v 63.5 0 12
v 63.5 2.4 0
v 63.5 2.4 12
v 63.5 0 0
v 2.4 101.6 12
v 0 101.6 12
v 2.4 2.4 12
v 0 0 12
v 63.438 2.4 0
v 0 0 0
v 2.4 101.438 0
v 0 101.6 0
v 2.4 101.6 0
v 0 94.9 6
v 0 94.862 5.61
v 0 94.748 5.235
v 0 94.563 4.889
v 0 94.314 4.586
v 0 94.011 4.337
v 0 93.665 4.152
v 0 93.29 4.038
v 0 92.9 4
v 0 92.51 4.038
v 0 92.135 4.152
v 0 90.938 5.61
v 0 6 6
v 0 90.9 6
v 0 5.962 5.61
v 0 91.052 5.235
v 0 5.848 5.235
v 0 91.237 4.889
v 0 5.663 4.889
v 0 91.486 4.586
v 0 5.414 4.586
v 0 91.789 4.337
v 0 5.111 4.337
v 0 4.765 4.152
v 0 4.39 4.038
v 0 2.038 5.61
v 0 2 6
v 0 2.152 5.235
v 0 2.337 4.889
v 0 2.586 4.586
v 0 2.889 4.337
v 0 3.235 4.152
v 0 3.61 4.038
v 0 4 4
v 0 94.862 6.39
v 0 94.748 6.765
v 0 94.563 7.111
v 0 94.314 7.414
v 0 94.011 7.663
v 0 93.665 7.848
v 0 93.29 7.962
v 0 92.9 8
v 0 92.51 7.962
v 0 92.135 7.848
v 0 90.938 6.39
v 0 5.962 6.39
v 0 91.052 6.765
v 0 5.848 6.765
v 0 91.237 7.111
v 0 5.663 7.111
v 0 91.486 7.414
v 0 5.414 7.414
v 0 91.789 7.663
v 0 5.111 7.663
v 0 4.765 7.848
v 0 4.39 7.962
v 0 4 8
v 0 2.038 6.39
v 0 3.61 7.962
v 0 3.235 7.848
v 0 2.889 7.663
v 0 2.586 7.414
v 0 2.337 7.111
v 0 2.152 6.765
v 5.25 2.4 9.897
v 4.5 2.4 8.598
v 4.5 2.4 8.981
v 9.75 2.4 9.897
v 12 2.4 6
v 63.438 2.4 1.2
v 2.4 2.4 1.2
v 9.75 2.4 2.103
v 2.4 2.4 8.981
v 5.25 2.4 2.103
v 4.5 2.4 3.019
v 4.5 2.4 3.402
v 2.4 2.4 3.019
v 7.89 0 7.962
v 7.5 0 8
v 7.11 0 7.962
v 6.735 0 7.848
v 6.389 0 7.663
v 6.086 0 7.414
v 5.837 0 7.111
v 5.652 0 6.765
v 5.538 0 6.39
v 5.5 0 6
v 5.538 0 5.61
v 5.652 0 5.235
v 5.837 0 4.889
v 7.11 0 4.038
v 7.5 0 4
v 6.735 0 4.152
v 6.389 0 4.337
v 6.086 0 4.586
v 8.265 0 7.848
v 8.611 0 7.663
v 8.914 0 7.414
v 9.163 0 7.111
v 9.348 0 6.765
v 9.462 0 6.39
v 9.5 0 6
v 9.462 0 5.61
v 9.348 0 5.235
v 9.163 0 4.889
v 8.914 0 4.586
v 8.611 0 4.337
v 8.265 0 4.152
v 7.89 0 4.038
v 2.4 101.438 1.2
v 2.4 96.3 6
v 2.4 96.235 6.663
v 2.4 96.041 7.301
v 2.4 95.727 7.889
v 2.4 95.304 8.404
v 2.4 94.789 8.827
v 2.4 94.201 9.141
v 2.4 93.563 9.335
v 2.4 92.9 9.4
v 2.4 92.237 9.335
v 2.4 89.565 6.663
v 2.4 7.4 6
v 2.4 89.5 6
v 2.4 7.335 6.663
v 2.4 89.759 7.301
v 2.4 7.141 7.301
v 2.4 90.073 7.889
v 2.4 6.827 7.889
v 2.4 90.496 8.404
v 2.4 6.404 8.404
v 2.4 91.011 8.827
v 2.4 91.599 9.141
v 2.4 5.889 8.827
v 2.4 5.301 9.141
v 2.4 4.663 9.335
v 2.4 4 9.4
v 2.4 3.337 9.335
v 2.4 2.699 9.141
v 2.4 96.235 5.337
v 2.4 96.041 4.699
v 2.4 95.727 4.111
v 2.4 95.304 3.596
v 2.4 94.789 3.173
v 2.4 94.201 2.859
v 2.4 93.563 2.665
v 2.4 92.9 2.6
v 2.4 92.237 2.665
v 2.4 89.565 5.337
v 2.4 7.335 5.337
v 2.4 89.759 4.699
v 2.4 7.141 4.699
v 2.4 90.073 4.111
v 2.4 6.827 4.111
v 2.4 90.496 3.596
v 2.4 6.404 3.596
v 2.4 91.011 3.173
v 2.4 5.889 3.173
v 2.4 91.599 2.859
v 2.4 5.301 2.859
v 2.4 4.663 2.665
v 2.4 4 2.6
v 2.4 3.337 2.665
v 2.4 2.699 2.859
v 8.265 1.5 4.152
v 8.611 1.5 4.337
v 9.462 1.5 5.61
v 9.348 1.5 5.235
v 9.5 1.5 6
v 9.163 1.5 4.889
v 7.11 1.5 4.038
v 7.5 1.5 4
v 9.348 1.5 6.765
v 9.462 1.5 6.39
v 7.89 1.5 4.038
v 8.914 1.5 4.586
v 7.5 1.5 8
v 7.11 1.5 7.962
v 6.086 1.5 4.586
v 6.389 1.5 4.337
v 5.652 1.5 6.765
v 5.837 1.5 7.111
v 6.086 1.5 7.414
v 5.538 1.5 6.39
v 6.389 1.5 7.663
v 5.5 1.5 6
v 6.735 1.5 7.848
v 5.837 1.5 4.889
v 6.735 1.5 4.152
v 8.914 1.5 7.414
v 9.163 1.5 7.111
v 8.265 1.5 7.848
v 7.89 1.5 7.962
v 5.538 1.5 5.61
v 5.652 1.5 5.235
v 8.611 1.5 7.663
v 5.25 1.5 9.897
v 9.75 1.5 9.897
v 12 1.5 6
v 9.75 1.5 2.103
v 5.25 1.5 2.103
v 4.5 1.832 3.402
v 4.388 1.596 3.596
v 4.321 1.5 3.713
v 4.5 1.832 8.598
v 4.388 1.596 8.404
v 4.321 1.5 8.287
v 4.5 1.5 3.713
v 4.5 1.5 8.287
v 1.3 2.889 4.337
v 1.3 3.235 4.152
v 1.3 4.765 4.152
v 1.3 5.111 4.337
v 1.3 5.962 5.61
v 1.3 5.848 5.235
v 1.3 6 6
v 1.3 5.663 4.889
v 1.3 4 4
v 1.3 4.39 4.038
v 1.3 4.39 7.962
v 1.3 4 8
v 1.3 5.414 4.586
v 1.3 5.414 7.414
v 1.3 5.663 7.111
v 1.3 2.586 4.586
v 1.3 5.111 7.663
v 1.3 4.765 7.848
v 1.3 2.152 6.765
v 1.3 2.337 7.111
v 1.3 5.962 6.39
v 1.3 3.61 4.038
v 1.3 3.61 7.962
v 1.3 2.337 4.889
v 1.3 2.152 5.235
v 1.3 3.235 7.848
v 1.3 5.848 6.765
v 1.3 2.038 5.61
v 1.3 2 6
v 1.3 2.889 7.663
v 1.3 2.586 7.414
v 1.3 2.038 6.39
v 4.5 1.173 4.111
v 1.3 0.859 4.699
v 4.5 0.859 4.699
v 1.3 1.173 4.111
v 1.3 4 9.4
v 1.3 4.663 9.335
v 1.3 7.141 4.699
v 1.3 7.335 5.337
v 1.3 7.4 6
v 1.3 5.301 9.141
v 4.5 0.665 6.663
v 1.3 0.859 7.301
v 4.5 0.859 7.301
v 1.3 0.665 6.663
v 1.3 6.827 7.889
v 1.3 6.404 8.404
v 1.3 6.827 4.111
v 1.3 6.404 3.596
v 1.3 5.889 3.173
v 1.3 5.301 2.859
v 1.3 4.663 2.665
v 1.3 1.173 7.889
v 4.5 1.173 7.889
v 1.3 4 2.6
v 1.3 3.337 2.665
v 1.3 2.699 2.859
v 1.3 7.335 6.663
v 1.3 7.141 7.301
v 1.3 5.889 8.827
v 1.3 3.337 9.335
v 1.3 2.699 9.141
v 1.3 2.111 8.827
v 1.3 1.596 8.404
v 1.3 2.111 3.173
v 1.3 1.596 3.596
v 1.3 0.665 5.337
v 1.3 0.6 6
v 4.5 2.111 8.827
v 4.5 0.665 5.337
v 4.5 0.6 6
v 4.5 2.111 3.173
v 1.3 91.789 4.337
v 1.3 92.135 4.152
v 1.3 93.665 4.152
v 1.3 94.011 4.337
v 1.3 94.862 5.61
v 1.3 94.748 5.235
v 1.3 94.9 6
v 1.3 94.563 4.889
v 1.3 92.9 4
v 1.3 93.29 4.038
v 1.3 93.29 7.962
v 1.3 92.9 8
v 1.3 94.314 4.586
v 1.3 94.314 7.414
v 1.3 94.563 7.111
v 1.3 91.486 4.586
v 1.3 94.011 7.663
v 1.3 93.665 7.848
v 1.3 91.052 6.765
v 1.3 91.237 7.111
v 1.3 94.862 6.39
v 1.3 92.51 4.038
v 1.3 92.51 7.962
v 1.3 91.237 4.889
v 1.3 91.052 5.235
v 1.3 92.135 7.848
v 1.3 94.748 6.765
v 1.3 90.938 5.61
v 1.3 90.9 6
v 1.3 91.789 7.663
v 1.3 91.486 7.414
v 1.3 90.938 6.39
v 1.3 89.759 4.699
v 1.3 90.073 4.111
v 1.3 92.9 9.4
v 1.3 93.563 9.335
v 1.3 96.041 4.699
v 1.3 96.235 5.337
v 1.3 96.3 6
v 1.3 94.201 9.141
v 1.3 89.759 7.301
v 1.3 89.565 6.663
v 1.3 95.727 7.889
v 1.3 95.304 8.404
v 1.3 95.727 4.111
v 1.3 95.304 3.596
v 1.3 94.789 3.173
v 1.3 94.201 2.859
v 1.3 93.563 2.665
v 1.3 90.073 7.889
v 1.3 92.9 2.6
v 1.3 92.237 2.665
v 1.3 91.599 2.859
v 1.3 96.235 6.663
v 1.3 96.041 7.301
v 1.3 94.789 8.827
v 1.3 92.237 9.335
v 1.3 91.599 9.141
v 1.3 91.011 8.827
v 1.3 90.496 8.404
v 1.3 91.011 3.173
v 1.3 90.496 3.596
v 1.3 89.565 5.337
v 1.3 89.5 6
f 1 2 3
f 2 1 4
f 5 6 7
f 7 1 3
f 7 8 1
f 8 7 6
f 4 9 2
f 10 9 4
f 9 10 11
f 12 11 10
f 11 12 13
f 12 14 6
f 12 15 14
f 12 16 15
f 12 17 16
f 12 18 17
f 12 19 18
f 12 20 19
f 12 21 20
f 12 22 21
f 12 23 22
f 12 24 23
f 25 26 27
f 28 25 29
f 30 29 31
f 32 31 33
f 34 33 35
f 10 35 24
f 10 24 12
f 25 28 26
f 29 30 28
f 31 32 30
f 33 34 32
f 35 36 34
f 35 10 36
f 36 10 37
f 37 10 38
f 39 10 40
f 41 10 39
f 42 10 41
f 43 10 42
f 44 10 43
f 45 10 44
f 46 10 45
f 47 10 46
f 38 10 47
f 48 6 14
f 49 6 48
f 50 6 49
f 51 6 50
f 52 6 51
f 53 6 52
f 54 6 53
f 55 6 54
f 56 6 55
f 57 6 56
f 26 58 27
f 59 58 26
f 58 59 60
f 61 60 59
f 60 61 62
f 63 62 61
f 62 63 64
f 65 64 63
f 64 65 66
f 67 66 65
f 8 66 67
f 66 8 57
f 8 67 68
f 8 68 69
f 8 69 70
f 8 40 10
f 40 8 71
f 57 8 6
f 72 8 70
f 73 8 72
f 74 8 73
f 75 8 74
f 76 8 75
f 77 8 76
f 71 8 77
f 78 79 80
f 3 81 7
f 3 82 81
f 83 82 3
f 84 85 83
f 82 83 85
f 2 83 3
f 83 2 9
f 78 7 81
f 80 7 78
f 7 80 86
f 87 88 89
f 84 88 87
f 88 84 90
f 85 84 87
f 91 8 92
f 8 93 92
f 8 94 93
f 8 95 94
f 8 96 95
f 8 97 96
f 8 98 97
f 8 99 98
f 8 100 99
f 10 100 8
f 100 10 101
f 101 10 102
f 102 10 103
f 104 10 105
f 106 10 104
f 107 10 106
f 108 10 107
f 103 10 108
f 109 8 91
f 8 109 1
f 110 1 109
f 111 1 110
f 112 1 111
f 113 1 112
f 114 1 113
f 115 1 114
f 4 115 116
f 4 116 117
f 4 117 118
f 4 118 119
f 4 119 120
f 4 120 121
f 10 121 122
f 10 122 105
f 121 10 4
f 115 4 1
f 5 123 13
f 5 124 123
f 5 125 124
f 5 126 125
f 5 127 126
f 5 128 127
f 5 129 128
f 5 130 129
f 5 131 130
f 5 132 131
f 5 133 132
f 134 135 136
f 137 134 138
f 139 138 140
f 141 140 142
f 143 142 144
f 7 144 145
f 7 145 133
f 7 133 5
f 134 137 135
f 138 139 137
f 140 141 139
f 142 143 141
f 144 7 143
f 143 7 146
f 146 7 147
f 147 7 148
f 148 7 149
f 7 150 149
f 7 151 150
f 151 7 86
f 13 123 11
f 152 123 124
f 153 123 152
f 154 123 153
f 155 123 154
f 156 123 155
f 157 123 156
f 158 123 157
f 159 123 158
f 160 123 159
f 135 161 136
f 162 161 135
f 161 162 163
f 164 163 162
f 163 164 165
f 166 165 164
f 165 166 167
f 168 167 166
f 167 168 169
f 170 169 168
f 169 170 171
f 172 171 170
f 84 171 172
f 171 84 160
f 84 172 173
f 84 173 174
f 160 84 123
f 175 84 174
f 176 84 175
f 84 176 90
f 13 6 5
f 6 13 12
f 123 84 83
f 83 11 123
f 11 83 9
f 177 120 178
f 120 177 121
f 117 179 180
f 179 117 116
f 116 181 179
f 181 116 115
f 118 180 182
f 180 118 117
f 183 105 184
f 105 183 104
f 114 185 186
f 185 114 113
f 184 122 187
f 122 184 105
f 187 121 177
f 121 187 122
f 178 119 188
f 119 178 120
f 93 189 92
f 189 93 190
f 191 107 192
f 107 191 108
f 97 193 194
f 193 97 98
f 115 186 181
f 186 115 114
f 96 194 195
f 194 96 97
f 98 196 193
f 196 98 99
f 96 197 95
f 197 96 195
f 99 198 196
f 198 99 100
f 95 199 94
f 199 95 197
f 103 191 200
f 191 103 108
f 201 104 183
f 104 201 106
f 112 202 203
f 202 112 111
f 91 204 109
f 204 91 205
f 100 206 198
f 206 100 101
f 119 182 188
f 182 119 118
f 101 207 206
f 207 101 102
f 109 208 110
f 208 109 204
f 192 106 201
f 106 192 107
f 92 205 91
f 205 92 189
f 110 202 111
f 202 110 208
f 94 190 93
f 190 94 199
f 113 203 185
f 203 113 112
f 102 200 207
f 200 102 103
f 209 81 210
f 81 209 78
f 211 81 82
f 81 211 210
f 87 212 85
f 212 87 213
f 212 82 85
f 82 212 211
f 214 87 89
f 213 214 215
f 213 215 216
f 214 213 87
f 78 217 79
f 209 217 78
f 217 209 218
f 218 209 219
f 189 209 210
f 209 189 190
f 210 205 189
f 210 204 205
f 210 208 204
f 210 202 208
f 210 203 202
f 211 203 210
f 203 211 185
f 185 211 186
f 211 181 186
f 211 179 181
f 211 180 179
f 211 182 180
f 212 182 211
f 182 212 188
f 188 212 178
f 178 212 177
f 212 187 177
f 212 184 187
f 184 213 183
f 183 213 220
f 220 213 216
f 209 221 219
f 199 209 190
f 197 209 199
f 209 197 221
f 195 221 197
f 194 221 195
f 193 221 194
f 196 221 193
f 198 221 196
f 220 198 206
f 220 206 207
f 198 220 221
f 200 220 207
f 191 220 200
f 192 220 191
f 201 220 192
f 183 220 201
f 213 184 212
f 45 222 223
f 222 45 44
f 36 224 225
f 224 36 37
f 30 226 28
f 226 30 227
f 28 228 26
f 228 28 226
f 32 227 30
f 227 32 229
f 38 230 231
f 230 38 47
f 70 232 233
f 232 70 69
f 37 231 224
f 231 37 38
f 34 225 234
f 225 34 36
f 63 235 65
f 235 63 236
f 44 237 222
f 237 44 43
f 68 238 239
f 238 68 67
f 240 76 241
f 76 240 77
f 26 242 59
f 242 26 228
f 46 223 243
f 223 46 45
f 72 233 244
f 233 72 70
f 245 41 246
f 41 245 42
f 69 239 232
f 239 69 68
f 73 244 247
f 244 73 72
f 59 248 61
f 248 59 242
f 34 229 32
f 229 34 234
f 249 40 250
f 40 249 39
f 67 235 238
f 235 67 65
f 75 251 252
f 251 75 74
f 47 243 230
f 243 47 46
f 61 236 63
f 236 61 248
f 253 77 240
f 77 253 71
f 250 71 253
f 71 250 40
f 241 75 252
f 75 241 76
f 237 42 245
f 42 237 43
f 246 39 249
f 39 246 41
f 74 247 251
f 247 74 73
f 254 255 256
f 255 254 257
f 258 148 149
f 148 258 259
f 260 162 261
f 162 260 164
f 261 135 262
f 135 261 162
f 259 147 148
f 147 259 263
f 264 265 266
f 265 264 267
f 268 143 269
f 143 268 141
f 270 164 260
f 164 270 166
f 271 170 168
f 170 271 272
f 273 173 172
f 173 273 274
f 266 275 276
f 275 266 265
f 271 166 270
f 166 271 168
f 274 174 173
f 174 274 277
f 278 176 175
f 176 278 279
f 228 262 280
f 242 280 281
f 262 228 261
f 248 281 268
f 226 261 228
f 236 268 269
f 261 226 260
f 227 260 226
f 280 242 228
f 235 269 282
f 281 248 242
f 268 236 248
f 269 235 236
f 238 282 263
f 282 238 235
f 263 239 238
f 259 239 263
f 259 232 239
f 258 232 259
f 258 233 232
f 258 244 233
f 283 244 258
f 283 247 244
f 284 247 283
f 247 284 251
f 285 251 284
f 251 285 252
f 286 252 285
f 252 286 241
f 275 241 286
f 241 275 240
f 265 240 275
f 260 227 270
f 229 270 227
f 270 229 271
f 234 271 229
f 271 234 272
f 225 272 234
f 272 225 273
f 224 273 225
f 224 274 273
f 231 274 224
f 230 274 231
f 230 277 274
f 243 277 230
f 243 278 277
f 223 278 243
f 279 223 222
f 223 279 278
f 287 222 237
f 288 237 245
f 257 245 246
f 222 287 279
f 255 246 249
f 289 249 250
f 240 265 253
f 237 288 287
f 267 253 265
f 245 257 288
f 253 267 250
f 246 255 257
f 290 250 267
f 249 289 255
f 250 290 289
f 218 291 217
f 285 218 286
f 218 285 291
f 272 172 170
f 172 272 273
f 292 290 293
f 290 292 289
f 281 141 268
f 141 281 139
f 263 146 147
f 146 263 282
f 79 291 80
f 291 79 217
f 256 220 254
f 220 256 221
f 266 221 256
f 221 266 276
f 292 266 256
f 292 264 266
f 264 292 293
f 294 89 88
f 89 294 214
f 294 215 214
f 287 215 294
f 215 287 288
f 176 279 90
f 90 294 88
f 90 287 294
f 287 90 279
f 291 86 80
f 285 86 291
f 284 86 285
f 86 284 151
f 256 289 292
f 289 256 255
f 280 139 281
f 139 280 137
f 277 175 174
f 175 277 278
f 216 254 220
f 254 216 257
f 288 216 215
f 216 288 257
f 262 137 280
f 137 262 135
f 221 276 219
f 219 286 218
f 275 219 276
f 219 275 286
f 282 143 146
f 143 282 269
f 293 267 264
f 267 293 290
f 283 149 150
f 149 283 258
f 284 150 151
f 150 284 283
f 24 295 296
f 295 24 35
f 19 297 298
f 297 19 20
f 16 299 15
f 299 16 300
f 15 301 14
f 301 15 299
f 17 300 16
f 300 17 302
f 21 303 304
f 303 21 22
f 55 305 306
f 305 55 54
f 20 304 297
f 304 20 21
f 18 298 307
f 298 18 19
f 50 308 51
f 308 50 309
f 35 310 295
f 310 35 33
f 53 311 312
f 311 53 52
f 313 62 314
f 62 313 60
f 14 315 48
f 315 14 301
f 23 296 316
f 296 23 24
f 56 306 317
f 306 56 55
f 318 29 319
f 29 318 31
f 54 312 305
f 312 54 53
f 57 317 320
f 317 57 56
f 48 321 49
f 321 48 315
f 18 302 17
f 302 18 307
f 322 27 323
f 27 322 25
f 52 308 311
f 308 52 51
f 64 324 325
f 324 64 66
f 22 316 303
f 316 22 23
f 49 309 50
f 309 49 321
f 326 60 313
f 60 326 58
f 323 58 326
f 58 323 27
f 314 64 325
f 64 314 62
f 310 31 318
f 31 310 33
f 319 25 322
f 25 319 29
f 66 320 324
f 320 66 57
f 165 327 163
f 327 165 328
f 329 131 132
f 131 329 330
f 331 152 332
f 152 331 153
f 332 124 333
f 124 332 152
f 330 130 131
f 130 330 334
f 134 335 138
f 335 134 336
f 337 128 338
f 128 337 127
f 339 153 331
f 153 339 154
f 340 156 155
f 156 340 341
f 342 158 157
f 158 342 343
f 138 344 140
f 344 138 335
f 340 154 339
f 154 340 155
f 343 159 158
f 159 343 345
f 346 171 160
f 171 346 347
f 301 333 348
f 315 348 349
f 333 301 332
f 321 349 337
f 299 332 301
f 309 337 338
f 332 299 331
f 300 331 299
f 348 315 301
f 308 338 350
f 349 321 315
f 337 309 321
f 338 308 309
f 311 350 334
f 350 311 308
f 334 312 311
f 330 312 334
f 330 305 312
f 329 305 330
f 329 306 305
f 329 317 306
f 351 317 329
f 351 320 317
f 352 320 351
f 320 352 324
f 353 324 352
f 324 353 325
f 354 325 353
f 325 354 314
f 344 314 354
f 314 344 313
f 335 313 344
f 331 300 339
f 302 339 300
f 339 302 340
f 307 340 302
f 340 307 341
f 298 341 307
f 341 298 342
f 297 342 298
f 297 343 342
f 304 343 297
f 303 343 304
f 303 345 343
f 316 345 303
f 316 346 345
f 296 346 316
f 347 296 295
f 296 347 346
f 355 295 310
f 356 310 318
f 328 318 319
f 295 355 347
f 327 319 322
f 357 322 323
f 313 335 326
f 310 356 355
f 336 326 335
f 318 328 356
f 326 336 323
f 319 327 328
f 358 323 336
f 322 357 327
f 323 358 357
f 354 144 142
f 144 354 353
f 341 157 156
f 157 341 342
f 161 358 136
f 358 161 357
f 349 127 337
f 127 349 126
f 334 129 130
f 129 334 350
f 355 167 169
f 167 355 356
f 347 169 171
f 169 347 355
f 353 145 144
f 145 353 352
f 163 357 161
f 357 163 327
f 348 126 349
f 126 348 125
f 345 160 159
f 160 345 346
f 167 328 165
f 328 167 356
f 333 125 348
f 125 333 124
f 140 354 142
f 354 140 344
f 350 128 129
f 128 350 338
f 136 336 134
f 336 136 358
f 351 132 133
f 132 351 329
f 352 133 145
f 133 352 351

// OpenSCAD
//
// mounting bracket for Olof's front panel (need 2)
//


e = 0.1;
$fn = 32;

mm = 25.4;

pcb_setback = 7.5;			/* PCB hole from edge */
front_raise = 4.0;			/* panel hole from top surf of pcb */
hole_dia = 4.0;
head_dia = 6.8;			/* 6-32 screw head diameter */

head_dep = 2;			/* relief depth */

front_space = 3.5*mm;		/* front panel hole spacing */

bracket_wid = 12;
bracket_thk = 2.4;
side_thk = 1.2;

// short version for test print
// bracket_pcb_len = 1*mm;	/* length along pcb */
// bracket_panel_hgt = 1*mm;	/* height behind panel */

bracket_pcb_len = 2.5*mm;	/* length along pcb */
bracket_panel_hgt = 4.0*mm;	/* height behind panel */

module base() {

     cube( [bracket_pcb_len, bracket_thk, bracket_wid]);
     cube( [bracket_thk, bracket_panel_hgt, bracket_wid]);

     linear_extrude( height=side_thk, center=false, convexity=10) {
	  polygon( [[bracket_pcb_len, bracket_thk-e],
		   [bracket_thk-e, bracket_panel_hgt],
		   [0,0]]);
     }
}


module bracket() {

     difference() {
//     {
	  base();

	  // home for PCB mount
	  translate( [pcb_setback, -e, bracket_wid/2]) {
	       rotate( [-90, 0, 0]) {
		    cylinder( d=hole_dia, h=10);
		    translate( [0, 0, 1.6]) {
			 $fn = 6;
			 cylinder( d=9, h=head_dep+bracket_thk/2);
		    }
	       }
	  }

	  // hole for FP mount
	  translate( [bracket_thk+e, front_raise, bracket_wid/2]) {
	       rotate( [-90, 0, 90]) {
		    cylinder( d=hole_dia, h=10);
		    translate( [0, 0, -head_dep])
		    cylinder( d=head_dia, h=head_dep+bracket_thk/2);
	       }
	  }

	  // hole for FP mount
	  translate( [bracket_thk+e, front_raise+front_space, bracket_wid/2]) {
	       rotate( [-90, 0, 90]) {
		    cylinder( d=hole_dia, h=10);
		    translate( [0, 0, -head_dep])
		    cylinder( d=head_dia, h=head_dep+bracket_thk/2);
	       }
	  }


     }
}

bracket();
